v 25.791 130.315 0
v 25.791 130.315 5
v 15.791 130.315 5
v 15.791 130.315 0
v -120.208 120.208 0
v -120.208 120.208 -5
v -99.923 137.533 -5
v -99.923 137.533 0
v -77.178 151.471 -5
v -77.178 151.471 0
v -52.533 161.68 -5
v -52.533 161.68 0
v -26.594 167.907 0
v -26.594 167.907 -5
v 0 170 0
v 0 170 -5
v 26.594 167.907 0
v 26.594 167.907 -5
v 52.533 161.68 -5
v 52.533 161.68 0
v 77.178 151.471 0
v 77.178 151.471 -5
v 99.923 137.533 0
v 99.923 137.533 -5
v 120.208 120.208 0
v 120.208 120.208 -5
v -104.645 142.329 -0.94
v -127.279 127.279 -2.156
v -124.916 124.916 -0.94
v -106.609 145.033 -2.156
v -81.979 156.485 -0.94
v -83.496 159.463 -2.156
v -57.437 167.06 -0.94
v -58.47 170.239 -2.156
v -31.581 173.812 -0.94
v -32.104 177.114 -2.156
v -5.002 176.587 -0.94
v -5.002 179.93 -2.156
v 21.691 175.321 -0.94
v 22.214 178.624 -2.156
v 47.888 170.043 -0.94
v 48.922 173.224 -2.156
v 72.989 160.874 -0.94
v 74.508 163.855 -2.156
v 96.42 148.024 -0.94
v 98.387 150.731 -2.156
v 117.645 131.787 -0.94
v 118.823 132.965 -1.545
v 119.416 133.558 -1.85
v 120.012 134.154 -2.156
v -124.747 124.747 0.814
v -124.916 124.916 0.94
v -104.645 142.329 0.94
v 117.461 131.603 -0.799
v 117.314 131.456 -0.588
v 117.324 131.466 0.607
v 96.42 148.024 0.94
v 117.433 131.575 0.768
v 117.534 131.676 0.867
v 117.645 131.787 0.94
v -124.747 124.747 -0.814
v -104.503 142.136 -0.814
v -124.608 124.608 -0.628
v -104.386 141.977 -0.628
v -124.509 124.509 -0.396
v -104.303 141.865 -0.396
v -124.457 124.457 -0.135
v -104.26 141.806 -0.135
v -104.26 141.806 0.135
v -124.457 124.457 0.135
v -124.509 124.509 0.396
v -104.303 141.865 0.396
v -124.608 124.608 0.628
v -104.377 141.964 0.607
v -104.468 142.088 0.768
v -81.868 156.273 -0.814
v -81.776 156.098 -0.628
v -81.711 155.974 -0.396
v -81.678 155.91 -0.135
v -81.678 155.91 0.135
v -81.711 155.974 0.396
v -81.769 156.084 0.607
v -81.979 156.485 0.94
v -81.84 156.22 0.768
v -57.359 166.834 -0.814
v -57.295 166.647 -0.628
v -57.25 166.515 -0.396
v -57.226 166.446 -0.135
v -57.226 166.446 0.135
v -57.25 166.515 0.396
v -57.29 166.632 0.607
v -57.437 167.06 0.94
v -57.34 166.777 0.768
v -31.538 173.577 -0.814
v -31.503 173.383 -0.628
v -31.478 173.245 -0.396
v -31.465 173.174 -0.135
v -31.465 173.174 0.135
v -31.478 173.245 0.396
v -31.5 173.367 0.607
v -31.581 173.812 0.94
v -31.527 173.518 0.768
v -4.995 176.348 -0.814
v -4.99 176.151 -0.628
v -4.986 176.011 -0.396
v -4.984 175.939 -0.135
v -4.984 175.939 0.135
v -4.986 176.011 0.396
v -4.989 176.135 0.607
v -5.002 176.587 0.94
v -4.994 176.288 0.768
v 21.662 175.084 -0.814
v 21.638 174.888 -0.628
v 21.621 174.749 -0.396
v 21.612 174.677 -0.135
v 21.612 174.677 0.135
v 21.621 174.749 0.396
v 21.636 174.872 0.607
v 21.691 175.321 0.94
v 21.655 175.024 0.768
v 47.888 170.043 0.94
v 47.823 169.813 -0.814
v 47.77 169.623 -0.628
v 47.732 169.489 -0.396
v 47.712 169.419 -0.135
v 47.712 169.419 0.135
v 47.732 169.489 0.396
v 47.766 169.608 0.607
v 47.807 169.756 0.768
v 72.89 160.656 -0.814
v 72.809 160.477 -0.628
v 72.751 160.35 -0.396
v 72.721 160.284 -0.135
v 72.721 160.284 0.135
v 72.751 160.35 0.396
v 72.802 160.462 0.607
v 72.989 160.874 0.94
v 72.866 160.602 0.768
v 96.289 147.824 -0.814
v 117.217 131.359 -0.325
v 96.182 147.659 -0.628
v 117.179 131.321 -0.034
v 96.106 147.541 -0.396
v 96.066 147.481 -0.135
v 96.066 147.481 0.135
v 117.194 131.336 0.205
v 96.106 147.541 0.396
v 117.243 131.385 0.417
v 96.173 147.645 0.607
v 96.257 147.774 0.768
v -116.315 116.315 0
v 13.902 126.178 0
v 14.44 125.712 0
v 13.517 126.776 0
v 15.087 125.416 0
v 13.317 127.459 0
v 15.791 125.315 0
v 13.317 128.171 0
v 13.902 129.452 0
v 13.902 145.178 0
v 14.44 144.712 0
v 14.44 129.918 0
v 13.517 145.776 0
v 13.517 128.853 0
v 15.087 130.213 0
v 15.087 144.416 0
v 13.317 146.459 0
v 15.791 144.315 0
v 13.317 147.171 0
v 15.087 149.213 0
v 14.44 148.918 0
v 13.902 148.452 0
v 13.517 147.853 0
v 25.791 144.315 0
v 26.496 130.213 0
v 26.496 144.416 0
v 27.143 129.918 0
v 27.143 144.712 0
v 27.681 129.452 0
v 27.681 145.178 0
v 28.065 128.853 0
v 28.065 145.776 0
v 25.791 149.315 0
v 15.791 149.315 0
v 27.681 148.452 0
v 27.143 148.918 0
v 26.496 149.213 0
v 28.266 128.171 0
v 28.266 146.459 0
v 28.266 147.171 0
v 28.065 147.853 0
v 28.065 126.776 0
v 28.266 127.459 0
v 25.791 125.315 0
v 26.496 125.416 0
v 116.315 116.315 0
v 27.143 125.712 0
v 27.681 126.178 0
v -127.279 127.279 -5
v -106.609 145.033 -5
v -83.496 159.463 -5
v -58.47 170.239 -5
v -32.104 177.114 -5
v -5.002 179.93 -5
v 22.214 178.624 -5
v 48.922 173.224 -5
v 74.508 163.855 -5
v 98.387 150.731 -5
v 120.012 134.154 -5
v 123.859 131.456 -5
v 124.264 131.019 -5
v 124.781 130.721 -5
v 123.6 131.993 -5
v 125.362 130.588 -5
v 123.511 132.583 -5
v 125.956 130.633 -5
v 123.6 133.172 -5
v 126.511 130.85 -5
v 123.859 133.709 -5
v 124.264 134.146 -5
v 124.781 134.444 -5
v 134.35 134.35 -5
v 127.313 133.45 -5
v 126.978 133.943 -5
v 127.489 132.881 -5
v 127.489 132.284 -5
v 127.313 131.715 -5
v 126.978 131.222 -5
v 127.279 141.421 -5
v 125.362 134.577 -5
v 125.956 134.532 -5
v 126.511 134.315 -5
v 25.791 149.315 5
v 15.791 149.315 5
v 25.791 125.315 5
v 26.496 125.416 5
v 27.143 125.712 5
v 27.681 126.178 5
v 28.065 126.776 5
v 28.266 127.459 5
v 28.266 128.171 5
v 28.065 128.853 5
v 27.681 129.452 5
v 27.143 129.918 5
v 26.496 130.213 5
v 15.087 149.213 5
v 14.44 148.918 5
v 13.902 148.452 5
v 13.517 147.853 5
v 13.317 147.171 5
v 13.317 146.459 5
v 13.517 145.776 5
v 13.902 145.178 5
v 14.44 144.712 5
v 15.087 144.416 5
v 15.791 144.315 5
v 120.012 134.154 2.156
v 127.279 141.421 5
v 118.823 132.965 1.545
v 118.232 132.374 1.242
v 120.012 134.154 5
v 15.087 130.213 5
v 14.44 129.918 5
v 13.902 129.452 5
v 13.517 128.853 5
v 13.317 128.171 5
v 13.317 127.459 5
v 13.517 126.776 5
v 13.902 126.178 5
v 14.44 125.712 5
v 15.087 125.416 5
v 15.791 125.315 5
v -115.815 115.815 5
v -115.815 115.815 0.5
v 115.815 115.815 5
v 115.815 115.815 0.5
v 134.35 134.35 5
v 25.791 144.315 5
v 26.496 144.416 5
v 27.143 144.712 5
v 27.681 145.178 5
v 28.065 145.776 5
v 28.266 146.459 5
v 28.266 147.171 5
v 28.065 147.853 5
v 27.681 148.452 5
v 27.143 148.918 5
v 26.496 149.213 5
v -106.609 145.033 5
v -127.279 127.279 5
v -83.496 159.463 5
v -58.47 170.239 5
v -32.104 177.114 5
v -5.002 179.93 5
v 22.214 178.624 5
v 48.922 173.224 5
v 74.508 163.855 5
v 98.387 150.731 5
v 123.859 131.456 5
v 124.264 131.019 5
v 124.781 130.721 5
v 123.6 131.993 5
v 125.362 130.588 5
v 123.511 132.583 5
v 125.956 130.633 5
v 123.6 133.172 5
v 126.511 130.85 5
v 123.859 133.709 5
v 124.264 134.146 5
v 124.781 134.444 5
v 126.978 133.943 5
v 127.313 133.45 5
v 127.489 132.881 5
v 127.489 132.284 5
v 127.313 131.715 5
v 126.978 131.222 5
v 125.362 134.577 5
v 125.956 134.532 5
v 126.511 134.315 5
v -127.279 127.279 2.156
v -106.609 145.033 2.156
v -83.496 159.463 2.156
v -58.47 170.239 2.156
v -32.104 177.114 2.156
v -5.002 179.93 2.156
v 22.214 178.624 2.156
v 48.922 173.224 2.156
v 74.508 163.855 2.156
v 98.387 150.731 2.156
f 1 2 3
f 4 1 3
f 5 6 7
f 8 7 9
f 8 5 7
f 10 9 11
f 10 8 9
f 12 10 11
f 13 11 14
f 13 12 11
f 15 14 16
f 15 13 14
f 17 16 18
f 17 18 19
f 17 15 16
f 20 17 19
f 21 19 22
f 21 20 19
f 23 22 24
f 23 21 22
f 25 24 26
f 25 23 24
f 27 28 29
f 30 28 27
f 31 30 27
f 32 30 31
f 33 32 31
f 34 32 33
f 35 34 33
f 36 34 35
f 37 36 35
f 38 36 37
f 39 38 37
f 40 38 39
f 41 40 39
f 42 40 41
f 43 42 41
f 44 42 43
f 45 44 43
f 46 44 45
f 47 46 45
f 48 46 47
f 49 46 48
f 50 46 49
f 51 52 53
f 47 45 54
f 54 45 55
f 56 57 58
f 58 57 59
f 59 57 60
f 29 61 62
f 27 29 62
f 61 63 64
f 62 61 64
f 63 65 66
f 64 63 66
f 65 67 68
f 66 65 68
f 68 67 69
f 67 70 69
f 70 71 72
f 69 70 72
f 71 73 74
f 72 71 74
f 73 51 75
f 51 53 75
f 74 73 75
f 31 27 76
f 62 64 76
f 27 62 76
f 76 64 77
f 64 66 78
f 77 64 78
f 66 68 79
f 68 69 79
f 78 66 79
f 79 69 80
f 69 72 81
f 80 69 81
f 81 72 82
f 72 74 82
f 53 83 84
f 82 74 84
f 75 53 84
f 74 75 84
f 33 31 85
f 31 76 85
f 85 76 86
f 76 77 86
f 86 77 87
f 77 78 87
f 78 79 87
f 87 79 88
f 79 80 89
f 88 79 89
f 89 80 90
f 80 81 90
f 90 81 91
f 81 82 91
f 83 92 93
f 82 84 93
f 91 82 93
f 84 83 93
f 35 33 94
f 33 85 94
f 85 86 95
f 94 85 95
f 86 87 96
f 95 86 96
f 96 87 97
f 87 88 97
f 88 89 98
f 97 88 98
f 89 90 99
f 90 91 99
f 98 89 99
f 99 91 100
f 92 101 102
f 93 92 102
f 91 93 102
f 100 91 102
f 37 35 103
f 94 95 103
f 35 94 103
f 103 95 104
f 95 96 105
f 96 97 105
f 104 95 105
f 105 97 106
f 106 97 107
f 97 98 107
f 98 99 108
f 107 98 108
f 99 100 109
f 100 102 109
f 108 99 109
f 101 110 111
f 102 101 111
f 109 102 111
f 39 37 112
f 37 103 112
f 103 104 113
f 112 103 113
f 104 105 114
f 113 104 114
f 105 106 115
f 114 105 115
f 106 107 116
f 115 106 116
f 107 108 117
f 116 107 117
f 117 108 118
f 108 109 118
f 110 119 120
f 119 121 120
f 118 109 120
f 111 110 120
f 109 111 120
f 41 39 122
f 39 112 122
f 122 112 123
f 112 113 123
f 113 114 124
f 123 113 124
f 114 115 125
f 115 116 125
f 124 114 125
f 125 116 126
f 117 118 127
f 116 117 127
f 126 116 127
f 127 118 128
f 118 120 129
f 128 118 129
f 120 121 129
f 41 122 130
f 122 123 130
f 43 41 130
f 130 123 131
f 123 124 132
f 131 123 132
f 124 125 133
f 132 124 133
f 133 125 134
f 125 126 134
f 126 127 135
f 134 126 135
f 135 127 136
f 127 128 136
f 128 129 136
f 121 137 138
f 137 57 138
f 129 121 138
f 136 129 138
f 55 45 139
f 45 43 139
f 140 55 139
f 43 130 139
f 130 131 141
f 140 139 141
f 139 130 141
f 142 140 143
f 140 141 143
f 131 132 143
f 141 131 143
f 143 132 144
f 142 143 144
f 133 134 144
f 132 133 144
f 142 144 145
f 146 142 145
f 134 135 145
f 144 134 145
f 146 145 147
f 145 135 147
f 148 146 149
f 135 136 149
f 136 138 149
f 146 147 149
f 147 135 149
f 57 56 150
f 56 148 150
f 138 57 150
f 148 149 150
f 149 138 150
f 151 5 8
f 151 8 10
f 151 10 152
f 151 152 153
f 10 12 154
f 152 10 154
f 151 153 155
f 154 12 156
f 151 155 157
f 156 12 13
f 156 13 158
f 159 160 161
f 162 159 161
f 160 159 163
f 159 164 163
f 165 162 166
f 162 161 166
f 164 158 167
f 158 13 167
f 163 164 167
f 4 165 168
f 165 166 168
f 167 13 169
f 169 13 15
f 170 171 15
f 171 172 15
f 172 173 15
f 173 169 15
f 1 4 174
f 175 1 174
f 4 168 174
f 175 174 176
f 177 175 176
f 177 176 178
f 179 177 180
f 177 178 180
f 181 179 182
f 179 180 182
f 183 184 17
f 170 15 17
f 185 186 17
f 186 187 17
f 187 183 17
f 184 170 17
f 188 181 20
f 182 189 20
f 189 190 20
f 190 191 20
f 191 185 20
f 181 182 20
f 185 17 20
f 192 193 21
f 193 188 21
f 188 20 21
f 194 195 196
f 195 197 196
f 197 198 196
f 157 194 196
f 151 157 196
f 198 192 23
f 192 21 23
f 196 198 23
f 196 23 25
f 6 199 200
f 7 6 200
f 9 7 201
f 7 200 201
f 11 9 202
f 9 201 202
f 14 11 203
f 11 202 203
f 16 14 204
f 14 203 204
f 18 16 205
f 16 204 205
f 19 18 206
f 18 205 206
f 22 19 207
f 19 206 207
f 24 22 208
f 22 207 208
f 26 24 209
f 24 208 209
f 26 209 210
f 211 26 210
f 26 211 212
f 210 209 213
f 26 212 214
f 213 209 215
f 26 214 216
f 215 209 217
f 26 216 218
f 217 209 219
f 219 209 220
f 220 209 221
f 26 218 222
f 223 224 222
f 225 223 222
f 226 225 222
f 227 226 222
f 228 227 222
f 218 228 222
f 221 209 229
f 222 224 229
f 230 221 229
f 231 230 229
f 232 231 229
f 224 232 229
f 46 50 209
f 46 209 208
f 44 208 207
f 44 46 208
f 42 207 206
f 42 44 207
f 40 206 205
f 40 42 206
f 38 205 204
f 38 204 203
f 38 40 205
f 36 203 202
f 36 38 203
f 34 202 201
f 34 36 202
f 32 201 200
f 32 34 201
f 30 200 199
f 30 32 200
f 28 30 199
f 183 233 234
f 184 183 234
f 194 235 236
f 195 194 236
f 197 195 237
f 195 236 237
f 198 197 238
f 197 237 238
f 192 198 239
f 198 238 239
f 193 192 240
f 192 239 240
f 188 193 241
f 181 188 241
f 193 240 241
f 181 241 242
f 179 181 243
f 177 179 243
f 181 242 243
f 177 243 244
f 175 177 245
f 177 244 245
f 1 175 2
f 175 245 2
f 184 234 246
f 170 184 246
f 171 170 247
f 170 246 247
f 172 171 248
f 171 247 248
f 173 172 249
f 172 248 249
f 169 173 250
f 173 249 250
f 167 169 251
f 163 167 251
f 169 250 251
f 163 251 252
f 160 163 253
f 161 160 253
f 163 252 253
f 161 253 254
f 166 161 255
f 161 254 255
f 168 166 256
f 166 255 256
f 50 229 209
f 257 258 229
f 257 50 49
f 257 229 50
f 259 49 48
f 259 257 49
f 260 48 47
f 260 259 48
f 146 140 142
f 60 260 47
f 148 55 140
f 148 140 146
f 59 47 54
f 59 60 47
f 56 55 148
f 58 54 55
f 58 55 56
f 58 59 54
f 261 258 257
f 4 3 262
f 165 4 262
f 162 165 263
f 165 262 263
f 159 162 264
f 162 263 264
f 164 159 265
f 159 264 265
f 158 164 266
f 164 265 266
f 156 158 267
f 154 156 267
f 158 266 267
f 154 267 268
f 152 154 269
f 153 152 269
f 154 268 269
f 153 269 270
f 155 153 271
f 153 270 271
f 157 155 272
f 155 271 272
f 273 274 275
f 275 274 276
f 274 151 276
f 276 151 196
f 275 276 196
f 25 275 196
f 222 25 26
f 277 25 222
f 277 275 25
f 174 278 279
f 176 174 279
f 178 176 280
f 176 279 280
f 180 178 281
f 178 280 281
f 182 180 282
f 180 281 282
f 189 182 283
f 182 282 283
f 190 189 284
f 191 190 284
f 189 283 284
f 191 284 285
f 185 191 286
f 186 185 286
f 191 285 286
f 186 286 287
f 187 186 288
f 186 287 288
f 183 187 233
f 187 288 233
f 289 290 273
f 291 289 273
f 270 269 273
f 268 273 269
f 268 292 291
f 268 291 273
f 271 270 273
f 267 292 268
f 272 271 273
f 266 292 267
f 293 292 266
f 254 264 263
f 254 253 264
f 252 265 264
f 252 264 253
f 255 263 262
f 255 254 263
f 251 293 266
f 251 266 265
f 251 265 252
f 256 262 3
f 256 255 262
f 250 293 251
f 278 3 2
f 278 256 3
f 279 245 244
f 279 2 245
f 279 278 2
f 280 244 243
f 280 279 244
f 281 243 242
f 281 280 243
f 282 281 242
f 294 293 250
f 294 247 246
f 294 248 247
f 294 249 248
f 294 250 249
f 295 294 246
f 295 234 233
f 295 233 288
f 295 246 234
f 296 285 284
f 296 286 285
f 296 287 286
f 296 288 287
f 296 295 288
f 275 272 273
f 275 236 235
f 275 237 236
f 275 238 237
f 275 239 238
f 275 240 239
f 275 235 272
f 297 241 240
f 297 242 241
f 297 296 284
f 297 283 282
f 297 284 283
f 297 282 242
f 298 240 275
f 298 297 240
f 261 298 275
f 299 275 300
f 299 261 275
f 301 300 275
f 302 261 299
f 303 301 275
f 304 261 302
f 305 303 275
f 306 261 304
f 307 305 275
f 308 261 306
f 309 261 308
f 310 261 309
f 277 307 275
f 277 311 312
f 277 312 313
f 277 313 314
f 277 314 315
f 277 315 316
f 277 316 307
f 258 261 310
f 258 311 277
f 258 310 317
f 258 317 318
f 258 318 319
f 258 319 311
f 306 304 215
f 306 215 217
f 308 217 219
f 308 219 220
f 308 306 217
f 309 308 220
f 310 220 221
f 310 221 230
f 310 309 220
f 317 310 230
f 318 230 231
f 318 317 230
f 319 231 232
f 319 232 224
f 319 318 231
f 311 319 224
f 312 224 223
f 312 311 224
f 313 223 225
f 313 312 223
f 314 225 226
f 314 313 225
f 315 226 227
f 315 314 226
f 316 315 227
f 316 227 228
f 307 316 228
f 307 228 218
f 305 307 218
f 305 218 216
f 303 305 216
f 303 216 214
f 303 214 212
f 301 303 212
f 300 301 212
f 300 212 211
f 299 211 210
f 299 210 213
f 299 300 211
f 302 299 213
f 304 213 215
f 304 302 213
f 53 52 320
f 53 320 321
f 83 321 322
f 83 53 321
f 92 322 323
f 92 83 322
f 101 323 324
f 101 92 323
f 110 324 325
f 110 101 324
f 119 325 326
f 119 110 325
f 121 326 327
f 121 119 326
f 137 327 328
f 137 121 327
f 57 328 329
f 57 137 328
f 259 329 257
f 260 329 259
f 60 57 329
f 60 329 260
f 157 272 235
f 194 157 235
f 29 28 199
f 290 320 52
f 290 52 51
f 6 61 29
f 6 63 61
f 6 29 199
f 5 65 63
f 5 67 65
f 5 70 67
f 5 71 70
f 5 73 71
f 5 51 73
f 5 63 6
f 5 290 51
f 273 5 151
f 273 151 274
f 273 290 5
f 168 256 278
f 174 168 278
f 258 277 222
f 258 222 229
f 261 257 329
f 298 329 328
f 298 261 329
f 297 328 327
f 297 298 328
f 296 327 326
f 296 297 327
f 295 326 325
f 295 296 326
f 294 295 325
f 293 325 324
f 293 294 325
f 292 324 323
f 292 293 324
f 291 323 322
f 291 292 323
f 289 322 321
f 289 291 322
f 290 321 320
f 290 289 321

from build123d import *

# Parameters (mm, degrees)
BOSS_EXTRU_1_DEPTH           = 5
BOSS_EXTRU_2_DEPTH           = 5
BOSS_EXTRU_2_DEPTH_BACK      = 5
BOSS_EXTRU_3_DEPTH           = 5
BOSS_EXTRU_3_DEPTH_BACK      = 5
ESQUISSE7_R                  = 2
ENL_V_MAT_EXTRU_4_DEPTH      = 225.666419389
ENL_V_MAT_EXTRU_4_DEPTH_BACK = 225.666419389
ENL_V_MAT_EXTRU_6_DEPTH      = 225.666419389
ENL_V_MAT_EXTRU_6_DEPTH_BACK = 225.666419389
CHANFREIN1_SIZE              = 0.5


with BuildPart() as part:
    # Esquisse1 → Boss.-Extru.1 (new body)
    with BuildSketch(Plane.XY):
        with BuildLine():
            Line((-120.208152802, 115.814760073), (120.208152802, 115.814760073))
            Line((120.208152802, 115.814760073), (120.208152802, 120.208152802))
            ThreePointArc((120.208152802, 120.208152802), (0, 170), (-120.208152802, 120.208152802))
            Line((-120.208152802, 120.208152802), (-120.208152802, 115.814760073))
        make_face()
    extrude(amount=BOSS_EXTRU_1_DEPTH)

    # Esquisse2 → Boss.-Extru.2 (add, two sides: drawn at the far end of the back side and taken through both)
    with BuildSketch(Plane(origin=(0, 0, 0), x_dir=(-1, 0, 0), z_dir=(0, 0, -1)).offset(-BOSS_EXTRU_2_DEPTH_BACK)):
        with BuildLine():
            Line((127.279220614, 127.279220614), (120.208152802, 120.208152802))
            ThreePointArc((120.208152802, 120.208152802), (0, 170), (-120.208152802, 120.208152802))
            Line((-120.208152802, 120.208152802), (-127.279220614, 127.279220614))
            ThreePointArc((-127.279220614, 127.279220614), (0, 180), (127.279220614, 127.279220614))
        make_face()
    extrude(amount=BOSS_EXTRU_2_DEPTH + BOSS_EXTRU_2_DEPTH_BACK)

    # Enlèvement de matière-Balayage1: sweep along a path in Esquisse3
    with BuildLine(Plane(origin=(0, 0, 0), x_dir=(-1, 0, 0), z_dir=(0, 0, -1))) as enl_vement_de_mati_re_balayage1_path:
        ThreePointArc((126.572113832, 126.572113832), (0, 179), (-126.572113832, 126.572113832))
    # Esquisse5 → Enlèvement de matière-Balayage1 (sweep, cut)
    with BuildSketch(Plane(origin=(0, 0, 0), x_dir=(0, 0, -1), z_dir=(0.7071067811865468, -0.7071067811865483, 0))):
        with BuildLine():
            Line((-0.939692621, 176.657979857), (-2.156088475, 180))
            Line((-2.156088475, 180), (2.156088475, 180))
            Line((2.156088475, 180), (0.939692621, 176.657979857))
            ThreePointArc((0.939692621, 176.657979857), (0, 176), (-0.939692621, 176.657979857))
        make_face()
    sweep(path=enl_vement_de_mati_re_balayage1_path.line, mode=Mode.SUBTRACT)

    # Esquisse7 → Boss.-Extru.3 (add, two sides: drawn at the far end of the back side and taken through both)
    with BuildSketch(Plane(origin=(0, 0, 0), x_dir=(-1, 0, 0), z_dir=(0, 0, -1)).offset(-BOSS_EXTRU_3_DEPTH_BACK)):
        Polygon((-123.743686708, 123.743686708), (-134.350288425, 134.350288425), (-127.279220614, 141.421356237), (-116.672618896, 130.81475452), align=None)
        with Locations((-125.511453661, 132.582521472)):
            Circle(ESQUISSE7_R, mode=Mode.SUBTRACT)
    extrude(amount=BOSS_EXTRU_3_DEPTH + BOSS_EXTRU_3_DEPTH_BACK)

    # Esquisse8 → Enlèv. mat.-Extru.4 (cut, two sides: drawn at the far end of the back side and taken through both)
    with BuildSketch(Plane(origin=(0, 0, 0), x_dir=(-1, 0, 0), z_dir=(0, 0, -1)).offset(-ENL_V_MAT_EXTRU_4_DEPTH_BACK)):
        Polygon((-120.208152802, 120.208152802), (-104.630387374, 104.630387374), (-145.023097607, 109.535343621), (-125.124551125, 125.124551125), align=None)
        Polygon((127.279220614, 127.279220614), (100.741517302, 100.741517302), (140.507843055, 93.246561367), align=None)
    extrude(amount=ENL_V_MAT_EXTRU_4_DEPTH + ENL_V_MAT_EXTRU_4_DEPTH_BACK, mode=Mode.SUBTRACT)

    # Esquisse10 → Enlèv. mat.-Extru.6 (cut, two sides: drawn at the far end of the back side and taken through both)
    with BuildSketch(Plane(origin=(0, 0, 0), x_dir=(-1, 0, 0), z_dir=(0, 0, -1)).offset(-ENL_V_MAT_EXTRU_6_DEPTH_BACK)):
        with BuildLine():
            Line((-25.791169082, 149.314760073), (-15.791169082, 149.314760073))
            ThreePointArc((-15.791169082, 149.314760073), (-13.291169082, 146.814760073), (-15.791169082, 144.314760073))
            Line((-15.791169082, 144.314760073), (-25.791169082, 144.314760073))
            ThreePointArc((-25.791169082, 144.314760073), (-28.291169082, 146.814760073), (-25.791169082, 149.314760073))
        make_face()
        with BuildLine():
            Line((-25.791169082, 130.314760073), (-15.791169082, 130.314760073))
            ThreePointArc((-15.791169082, 130.314760073), (-13.291169082, 127.814760073), (-15.791169082, 125.314760073))
            Line((-15.791169082, 125.314760073), (-25.791169082, 125.314760073))
            ThreePointArc((-25.791169082, 125.314760073), (-28.291169082, 127.814760073), (-25.791169082, 130.314760073))
        make_face()
    extrude(amount=ENL_V_MAT_EXTRU_6_DEPTH + ENL_V_MAT_EXTRU_6_DEPTH_BACK, mode=Mode.SUBTRACT)

    # Chanfrein1
    chanfrein1_edges = [part.edges().sort_by_distance(p)[0] for p in [
        (0, 115.814760073, 0),
    ]]
    chamfer(chanfrein1_edges, length=CHANFREIN1_SIZE)


solid = part.part
